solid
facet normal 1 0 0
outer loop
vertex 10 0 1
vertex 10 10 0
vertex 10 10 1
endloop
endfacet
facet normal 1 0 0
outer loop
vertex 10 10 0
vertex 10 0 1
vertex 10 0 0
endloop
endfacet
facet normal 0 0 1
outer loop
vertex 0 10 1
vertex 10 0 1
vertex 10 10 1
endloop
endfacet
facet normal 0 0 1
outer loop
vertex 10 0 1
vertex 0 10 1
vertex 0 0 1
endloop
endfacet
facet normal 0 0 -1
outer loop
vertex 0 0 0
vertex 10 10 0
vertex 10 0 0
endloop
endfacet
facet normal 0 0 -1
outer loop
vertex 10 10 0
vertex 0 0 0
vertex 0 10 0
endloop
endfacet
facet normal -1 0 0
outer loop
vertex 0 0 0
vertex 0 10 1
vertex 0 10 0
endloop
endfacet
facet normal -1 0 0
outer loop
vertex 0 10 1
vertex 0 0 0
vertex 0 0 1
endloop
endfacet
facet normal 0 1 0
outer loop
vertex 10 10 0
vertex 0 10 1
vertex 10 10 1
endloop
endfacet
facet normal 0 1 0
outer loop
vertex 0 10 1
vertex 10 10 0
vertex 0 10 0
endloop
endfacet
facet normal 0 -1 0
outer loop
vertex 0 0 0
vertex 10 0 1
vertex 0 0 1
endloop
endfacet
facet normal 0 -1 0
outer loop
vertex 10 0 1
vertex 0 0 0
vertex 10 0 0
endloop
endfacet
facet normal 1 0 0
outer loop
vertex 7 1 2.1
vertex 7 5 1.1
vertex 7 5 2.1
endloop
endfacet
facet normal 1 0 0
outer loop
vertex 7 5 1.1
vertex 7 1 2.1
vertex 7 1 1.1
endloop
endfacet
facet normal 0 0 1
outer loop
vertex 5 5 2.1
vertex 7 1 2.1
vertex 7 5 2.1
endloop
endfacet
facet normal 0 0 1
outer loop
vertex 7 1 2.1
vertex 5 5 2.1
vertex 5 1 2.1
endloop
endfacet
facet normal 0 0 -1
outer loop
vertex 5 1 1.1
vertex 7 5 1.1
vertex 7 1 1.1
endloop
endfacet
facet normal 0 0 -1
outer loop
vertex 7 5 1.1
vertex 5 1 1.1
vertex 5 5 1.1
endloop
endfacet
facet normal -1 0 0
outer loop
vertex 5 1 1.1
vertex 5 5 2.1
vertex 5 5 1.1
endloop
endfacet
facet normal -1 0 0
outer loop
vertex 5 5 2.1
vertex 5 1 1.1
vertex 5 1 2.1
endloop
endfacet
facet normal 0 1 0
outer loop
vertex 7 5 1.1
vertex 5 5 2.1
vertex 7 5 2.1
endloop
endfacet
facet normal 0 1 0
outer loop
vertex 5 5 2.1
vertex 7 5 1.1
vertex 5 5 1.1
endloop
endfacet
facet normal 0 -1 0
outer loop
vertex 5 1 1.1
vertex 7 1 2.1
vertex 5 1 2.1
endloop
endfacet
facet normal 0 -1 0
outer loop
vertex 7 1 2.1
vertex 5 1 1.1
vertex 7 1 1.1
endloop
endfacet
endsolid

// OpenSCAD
// file: triangle.scad
module triangle(base=10, length=10, rise=2.5, z=1){
    
    points=[
        //bottom and top triangle portion
        [0,0,0],[0,0,z],[0,base,0],[0,base,z],
        [length,rise,0],[length,rise,z],
    ];
    
    faces=[
        [0,2,4], //bot
        [5,3,1], //top
        [0,2,3,1], //tangent brick
        [0,1,5,4], //side square
        [4,5,3,2], //side square
    ];
           
        
     polyhedron(points, faces);
        
        
 
    
    }
//triangle();
// main file
use <triangle.scad>;

cube([10,10,1]);

    //color("blue")
    //translate([5,0,2]) cylinder(h=1, r=1.5);
color("blue")
translate([5, 1, 1.1])cube([2, 4, 1]);
translate([7,5,1.1]) rotate([0,0,90]) triangle(base=4,length=4, rise=2,z=1);
